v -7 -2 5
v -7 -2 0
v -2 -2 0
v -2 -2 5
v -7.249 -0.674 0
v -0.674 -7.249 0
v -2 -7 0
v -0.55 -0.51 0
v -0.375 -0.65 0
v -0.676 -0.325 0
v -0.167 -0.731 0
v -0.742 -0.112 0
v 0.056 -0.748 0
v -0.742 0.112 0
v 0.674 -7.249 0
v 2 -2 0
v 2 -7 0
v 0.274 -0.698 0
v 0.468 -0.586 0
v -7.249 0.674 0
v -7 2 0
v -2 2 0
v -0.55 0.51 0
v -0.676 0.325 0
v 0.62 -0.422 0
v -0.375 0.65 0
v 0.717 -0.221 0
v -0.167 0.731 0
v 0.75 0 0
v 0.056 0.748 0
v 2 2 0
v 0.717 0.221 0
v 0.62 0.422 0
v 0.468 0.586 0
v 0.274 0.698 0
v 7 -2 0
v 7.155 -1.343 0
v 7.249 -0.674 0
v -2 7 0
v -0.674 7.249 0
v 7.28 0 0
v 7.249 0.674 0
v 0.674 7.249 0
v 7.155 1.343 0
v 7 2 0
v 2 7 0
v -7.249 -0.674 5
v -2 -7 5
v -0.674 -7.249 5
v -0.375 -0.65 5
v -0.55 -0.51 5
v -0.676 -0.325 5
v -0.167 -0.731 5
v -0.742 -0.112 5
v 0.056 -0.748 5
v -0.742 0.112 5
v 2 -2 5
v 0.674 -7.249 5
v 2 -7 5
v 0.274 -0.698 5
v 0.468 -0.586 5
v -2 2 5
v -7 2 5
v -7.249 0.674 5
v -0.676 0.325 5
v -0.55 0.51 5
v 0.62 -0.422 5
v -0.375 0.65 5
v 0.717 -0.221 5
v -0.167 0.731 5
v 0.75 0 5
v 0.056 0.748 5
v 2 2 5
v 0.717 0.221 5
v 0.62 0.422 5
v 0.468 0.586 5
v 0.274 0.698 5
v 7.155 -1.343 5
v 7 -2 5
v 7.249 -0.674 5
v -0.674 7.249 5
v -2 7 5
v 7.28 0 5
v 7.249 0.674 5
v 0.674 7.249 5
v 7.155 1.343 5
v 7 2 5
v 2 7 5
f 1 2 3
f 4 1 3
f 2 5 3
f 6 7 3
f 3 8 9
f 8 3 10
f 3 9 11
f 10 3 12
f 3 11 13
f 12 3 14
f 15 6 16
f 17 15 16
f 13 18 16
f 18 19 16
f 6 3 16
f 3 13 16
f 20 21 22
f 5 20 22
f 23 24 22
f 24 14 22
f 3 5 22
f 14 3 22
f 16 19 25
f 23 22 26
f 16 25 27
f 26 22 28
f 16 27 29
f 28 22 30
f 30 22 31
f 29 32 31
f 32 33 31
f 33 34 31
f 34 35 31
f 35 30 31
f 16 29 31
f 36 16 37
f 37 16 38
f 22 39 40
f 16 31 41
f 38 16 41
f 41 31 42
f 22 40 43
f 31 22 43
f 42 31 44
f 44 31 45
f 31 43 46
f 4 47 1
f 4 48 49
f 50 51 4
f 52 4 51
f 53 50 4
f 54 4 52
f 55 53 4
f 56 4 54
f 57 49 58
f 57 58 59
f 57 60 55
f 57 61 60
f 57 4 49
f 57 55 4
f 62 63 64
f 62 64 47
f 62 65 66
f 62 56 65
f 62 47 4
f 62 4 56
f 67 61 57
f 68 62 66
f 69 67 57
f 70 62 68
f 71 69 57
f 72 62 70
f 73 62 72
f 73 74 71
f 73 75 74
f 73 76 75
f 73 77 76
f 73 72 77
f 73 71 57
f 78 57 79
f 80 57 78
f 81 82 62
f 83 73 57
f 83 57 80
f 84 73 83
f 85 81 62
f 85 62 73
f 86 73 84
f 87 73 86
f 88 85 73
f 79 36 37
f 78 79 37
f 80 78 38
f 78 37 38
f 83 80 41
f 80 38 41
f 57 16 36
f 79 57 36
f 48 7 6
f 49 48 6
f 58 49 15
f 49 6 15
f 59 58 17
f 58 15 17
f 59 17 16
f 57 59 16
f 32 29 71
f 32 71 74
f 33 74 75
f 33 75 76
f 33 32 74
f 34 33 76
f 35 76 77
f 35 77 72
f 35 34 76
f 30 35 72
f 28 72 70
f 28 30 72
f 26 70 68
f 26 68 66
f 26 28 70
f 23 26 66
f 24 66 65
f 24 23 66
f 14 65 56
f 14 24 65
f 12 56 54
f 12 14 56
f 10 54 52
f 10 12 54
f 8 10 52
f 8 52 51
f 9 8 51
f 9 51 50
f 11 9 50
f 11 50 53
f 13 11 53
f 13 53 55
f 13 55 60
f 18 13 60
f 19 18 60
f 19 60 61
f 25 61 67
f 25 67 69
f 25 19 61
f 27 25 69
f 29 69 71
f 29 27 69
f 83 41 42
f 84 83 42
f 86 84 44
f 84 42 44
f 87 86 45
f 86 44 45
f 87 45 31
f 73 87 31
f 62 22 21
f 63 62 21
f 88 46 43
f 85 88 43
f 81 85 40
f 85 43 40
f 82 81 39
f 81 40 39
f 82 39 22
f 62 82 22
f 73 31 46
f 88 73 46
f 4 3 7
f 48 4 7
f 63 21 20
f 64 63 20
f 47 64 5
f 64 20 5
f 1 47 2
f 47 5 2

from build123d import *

# Parameters (mm, degrees)
SKETCH1_R           = 0.75
BOSS_EXTRUDE1_DEPTH = 5


with BuildPart() as part:
    # Sketch1 → Boss-Extrude1 (new body)
    # profile 1 of 5: a face of its own
    with BuildSketch(Plane.XY):
        with BuildLine():
            Line((-7, -2), (-2, -2))
            Line((-2, -2), (-2, 0))
            Line((-2, 0), (-2, 2))
            Line((-2, 2), (-7, 2))
            ThreePointArc((-7, 2), (-7.280109889, 0), (-7, -2))
        make_face()
    # profile 2 of 5: a face of its own
    with BuildSketch(Plane.XY):
        with BuildLine():
            Line((0, 2), (2, 2))
            Line((2, 2), (2, 7))
            ThreePointArc((2, 7), (0, 7.280109889), (-2, 7))
            Line((-2, 7), (-2, 2))
            Line((-2, 2), (0, 2))
        make_face()
    # profile 3 of 5: a face of its own
    with BuildSketch(Plane.XY):
        Polygon((-2, -2), (0, -2), (2, -2), (2, 0), (2, 2), (0, 2), (-2, 2), (-2, 0), align=None)
        Circle(SKETCH1_R, mode=Mode.SUBTRACT)
    # profile 4 of 5: a face of its own
    with BuildSketch(Plane.XY):
        with BuildLine():
            Line((2, -2), (0, -2))
            Line((0, -2), (-2, -2))
            Line((-2, -2), (-2, -7))
            ThreePointArc((-2, -7), (0, -7.280109889), (2, -7))
            Line((2, -7), (2, -2))
        make_face()
    # profile 5 of 5: a face of its own
    with BuildSketch(Plane.XY):
        with BuildLine():
            Line((2, 0), (2, -2))
            Line((2, -2), (7, -2))
            ThreePointArc((7, -2), (7.20974234, -1.009760064), (7.280109889, 0))
            ThreePointArc((7.280109889, 0), (7.20974234, 1.009760064), (7, 2))
            Line((7, 2), (2, 2))
            Line((2, 2), (2, 0))
        make_face()
    extrude(amount=BOSS_EXTRUDE1_DEPTH)


solid = part.part
